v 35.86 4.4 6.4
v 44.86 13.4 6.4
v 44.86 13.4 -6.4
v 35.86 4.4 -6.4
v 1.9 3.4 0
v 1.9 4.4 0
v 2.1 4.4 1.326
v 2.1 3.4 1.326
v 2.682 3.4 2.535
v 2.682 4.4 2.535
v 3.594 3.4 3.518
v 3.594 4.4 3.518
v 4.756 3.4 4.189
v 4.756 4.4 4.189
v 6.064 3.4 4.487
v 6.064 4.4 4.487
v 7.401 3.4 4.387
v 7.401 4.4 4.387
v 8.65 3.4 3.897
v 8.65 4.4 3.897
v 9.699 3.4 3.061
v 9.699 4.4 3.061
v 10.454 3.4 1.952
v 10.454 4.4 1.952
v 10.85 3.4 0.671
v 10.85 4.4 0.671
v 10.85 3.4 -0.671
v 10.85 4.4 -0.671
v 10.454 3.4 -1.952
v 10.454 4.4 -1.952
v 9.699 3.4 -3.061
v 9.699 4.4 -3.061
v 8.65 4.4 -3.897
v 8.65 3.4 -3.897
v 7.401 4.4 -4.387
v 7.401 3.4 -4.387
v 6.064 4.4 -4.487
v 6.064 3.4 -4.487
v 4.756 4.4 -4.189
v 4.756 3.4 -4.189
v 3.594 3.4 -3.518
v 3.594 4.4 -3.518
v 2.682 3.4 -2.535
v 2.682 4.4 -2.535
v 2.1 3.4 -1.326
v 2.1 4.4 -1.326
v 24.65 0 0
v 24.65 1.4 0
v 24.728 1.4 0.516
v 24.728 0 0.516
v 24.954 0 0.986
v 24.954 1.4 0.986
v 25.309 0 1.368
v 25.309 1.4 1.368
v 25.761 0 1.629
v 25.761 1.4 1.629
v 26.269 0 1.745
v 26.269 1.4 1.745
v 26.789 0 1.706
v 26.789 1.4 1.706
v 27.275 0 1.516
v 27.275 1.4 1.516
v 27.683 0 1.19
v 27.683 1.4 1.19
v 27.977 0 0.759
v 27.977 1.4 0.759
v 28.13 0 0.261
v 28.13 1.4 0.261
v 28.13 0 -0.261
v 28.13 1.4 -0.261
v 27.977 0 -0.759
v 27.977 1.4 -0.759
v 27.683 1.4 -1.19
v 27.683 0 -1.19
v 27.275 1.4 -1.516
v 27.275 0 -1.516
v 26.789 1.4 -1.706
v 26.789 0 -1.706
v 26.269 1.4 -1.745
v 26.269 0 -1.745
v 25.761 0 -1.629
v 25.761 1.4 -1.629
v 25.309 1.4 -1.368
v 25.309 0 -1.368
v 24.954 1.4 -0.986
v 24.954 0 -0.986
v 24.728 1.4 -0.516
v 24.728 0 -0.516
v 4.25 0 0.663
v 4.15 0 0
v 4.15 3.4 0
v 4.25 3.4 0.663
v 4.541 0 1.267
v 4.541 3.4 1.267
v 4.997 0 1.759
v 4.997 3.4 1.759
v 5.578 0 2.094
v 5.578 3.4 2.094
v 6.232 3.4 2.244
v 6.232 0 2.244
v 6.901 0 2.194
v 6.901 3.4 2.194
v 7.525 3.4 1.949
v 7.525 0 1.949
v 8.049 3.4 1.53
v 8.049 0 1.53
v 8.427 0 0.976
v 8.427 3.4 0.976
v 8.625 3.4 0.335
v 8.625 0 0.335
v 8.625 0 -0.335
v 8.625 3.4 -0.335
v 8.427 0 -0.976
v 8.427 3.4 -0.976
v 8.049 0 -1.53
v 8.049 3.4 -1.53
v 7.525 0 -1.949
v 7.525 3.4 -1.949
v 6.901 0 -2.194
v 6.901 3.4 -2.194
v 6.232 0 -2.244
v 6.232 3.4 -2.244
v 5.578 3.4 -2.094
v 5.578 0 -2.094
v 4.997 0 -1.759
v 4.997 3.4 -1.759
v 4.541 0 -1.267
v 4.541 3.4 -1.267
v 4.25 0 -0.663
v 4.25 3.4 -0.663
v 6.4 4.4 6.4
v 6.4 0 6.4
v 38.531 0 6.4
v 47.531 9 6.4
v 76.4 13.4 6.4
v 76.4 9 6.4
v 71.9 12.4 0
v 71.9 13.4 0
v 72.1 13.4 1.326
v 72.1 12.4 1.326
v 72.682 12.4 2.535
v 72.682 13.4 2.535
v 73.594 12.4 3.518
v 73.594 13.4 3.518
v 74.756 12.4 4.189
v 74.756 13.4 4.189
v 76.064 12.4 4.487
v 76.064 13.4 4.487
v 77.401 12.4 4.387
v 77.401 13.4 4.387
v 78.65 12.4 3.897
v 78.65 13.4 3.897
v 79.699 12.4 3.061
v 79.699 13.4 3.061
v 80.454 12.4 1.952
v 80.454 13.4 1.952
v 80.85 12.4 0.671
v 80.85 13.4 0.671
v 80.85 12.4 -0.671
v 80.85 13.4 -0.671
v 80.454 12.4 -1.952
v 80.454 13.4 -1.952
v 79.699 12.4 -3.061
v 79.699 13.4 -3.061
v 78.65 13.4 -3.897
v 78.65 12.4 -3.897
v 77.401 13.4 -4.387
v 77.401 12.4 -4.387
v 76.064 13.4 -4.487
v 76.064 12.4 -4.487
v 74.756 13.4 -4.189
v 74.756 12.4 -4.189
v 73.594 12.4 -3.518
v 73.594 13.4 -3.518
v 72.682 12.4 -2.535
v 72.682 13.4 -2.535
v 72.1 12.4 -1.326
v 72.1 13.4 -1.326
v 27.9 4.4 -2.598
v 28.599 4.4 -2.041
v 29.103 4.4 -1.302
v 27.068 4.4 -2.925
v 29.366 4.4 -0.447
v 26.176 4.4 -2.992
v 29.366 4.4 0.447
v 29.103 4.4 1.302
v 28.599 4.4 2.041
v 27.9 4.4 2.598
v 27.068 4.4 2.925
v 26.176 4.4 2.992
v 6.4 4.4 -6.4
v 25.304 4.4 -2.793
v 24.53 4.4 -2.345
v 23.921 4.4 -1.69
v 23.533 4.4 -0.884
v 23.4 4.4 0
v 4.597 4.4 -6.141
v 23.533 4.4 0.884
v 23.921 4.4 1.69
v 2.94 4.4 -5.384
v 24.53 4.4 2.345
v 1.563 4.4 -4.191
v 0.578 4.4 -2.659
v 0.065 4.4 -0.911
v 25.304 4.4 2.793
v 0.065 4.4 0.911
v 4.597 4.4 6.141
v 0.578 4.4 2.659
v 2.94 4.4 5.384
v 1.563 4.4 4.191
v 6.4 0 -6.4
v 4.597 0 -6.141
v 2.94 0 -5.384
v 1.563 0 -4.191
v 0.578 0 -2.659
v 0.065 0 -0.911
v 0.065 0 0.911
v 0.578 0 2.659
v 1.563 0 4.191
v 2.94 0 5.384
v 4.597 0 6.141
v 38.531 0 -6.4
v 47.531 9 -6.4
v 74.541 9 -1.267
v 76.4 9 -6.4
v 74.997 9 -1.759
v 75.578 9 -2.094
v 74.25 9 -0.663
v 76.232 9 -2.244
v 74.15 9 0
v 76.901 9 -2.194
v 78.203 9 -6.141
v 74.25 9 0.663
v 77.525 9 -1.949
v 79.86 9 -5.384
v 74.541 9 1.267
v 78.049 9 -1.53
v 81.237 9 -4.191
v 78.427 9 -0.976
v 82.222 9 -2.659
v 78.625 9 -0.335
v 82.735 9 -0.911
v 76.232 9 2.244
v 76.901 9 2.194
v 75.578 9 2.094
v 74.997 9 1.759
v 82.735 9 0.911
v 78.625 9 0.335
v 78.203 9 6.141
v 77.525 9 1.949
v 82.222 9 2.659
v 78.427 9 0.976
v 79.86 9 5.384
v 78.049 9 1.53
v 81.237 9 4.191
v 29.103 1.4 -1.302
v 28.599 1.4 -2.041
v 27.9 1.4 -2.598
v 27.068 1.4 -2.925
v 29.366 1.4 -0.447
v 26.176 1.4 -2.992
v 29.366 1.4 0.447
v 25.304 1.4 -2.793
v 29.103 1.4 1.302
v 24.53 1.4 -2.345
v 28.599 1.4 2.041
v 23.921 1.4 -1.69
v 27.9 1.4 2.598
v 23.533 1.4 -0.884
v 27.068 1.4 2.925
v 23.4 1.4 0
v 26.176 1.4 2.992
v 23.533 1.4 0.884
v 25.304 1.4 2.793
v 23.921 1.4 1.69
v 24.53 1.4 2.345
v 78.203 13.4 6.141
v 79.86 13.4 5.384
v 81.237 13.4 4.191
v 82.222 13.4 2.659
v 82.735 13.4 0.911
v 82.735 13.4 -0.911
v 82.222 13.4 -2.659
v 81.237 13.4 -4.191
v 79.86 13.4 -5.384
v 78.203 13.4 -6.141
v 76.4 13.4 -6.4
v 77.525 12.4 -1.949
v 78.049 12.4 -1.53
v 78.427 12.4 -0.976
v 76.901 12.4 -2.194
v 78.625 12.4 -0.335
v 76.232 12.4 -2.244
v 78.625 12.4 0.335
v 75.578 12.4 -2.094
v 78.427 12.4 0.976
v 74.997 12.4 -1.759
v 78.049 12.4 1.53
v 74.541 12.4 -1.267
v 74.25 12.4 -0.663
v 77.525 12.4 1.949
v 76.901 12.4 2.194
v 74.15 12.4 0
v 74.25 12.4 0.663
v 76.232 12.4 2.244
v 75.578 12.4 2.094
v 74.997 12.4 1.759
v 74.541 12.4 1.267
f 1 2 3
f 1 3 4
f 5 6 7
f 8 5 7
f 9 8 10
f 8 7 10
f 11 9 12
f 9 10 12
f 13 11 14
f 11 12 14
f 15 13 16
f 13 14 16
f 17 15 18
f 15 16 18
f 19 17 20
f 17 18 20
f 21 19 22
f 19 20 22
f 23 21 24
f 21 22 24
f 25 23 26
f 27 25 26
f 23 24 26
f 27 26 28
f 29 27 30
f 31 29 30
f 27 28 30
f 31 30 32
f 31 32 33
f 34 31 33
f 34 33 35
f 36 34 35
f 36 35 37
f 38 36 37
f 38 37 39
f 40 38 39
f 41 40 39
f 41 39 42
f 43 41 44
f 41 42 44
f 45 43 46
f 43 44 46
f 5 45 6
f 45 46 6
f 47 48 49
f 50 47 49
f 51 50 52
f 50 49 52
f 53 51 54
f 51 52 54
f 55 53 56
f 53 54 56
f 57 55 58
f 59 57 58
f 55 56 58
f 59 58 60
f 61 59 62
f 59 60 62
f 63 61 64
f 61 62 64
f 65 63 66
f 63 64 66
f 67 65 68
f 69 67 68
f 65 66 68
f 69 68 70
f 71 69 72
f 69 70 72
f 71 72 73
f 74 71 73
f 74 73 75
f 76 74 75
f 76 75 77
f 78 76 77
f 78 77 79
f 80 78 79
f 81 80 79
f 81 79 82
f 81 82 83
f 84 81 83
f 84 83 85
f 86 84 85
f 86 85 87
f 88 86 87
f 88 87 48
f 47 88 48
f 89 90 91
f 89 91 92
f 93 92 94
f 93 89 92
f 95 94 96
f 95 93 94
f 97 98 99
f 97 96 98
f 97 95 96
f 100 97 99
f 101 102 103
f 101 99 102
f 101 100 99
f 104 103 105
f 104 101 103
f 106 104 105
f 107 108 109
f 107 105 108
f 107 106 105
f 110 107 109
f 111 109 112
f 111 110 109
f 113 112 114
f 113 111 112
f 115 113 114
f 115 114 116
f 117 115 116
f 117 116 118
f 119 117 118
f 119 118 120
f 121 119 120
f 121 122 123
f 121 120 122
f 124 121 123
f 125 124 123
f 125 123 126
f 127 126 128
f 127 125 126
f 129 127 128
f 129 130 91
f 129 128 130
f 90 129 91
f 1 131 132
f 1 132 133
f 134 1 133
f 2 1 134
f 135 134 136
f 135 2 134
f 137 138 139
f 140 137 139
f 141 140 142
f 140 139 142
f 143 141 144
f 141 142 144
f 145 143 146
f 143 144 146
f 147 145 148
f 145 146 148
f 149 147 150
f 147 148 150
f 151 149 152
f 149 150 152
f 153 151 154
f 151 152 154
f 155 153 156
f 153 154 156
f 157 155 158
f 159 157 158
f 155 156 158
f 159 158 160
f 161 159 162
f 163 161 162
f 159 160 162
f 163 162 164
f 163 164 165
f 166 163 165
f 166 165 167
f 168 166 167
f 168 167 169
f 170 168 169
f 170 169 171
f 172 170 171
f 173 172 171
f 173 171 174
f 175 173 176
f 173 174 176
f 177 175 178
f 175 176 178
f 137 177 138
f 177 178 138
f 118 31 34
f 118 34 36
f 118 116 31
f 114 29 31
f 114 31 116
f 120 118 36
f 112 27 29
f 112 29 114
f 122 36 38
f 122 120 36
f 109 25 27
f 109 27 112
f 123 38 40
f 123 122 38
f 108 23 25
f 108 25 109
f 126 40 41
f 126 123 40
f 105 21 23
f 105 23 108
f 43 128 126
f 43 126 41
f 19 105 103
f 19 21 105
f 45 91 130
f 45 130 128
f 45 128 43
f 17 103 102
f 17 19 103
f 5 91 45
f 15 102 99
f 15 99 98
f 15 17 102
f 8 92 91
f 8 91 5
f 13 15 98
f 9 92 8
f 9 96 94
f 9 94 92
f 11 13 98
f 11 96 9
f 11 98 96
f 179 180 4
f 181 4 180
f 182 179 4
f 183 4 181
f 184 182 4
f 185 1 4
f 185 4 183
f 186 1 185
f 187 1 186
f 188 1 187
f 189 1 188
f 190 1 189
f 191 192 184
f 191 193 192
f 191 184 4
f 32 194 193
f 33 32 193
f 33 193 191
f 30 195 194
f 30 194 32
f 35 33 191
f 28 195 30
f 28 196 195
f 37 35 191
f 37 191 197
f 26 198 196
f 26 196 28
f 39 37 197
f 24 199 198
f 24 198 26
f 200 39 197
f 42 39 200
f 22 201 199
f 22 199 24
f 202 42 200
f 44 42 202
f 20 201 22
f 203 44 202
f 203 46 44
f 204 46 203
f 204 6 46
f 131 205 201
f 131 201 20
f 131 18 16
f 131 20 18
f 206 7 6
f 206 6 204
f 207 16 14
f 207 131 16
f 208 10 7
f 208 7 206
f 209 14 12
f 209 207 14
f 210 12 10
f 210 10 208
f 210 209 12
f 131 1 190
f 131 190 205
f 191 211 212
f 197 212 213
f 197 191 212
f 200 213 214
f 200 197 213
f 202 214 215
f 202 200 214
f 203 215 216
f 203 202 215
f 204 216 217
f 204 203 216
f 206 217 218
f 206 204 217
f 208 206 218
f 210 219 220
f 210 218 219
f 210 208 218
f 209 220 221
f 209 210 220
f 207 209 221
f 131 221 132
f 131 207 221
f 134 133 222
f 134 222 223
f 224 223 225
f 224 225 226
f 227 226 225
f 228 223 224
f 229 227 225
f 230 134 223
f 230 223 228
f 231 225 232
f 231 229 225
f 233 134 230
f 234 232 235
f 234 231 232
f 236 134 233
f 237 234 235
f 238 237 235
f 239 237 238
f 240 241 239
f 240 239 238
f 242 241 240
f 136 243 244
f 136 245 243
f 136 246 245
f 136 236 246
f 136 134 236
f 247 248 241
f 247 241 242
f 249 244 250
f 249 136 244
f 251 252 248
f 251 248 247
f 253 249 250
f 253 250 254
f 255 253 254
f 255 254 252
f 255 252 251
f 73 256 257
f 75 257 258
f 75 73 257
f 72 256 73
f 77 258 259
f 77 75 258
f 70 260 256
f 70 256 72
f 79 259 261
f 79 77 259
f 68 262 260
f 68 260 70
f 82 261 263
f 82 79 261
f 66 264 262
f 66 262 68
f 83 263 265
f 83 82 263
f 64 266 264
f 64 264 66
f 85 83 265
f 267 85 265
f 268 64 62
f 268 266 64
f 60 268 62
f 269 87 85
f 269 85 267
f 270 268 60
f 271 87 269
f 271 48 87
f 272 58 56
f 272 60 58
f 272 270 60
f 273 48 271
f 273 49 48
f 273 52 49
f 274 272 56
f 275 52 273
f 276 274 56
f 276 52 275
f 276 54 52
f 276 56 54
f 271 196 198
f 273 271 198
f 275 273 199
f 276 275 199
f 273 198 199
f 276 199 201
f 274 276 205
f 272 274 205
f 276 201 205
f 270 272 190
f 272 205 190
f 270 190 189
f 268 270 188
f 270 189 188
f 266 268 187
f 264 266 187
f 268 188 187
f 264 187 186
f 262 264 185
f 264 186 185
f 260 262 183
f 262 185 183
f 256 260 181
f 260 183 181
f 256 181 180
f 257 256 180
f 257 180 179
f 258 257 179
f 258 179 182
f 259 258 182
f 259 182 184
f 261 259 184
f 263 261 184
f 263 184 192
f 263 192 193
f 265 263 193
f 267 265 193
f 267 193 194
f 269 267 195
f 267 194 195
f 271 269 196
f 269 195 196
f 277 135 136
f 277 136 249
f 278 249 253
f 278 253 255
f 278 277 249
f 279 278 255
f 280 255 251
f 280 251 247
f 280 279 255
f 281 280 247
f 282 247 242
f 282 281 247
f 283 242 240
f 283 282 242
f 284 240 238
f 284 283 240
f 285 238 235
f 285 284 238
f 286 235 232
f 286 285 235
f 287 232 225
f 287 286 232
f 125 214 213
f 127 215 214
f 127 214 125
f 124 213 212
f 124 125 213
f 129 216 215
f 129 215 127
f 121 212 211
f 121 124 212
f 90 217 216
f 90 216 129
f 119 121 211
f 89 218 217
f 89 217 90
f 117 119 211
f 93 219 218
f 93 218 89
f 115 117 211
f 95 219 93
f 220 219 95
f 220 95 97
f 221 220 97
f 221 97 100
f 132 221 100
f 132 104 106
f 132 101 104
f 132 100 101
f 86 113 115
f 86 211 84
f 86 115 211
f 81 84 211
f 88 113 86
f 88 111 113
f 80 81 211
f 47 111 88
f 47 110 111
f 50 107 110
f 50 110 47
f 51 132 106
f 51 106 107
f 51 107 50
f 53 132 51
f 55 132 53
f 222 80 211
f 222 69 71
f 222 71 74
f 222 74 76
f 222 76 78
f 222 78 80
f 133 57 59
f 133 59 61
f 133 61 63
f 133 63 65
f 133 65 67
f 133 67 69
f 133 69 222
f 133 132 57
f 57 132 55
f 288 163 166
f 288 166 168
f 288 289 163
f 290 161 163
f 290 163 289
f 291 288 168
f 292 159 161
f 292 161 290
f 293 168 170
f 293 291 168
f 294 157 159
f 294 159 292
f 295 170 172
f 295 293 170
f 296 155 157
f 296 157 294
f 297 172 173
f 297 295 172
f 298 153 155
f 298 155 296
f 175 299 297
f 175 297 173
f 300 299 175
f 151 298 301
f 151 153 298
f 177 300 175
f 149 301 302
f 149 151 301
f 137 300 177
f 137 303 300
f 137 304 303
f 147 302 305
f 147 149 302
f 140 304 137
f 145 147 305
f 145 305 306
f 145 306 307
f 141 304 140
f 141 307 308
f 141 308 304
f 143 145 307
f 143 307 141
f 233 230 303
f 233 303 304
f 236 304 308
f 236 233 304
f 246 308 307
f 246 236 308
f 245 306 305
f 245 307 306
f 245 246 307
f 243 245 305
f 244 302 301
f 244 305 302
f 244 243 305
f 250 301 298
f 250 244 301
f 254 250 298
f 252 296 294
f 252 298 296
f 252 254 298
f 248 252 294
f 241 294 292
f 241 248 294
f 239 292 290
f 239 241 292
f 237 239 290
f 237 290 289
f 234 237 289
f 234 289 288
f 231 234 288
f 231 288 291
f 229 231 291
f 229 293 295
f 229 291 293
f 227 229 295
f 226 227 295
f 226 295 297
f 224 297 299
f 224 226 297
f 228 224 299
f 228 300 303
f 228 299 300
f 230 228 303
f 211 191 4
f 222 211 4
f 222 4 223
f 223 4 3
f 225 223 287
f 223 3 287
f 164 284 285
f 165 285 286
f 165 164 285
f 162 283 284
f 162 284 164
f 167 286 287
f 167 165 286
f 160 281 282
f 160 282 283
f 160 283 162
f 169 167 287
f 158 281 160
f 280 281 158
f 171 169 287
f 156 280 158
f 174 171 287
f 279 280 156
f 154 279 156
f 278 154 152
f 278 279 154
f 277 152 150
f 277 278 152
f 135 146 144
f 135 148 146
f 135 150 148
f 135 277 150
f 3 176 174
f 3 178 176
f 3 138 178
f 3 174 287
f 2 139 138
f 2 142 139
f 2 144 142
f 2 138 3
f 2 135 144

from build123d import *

# Parameters (mm, degrees)
EXTRUDE_1_DEPTH          = 6.4
SKETCH_2_OUTSIDE_W       = 101.77
SKETCH_2_OUTSIDE_H       = 31.77
CUT_EXTRUDE_1_DEPTH      = 85.121103179
CUT_EXTRUDE_2_DEPTH      = 84.533226922
CUT_EXTRUDE_2_DEPTH_BACK = 84.533226922
SKETCH_3_R               = 2.25
SKETCH_4_R               = 4.5
CUT_EXTRUDE_3_DEPTH      = 1
SKETCH_5_R               = 4.5
CUT_EXTRUDE_4_DEPTH      = 1
SKETCH_6_R               = 3
CUT_EXTRUDE_5_DEPTH      = 3
SKETCH_7_R               = 1.75
CUT_EXTRUDE_6_DEPTH      = 84.533226922


with BuildPart() as part:
    # 草图1 → 凸台-拉伸1 (new, symmetric)
    with BuildSketch(Plane.XY):
        Polygon((0, 0), (38.531067812, 0), (47.531067812, 9), (82.8, 9), (82.8, 13.4), (44.86, 13.4), (35.86, 4.4), (0, 4.4), align=None)
    extrude(amount=EXTRUDE_1_DEPTH, both=True)

    # 草图2 outside → 切除-拉伸1 (cut, through all)
    with BuildSketch(Plane(origin=(0, 13.4, 0), x_dir=(1, 0, 0), z_dir=(0, 1, 0))):
        with Locations((41.4, 0)):
            Rectangle(SKETCH_2_OUTSIDE_W, SKETCH_2_OUTSIDE_H)
        with BuildLine():
            Line((76.4, 6.4), (44.86, 6.4))
            Line((44.86, 6.4), (35.86, 6.4))
            Line((35.86, 6.4), (6.4, 6.4))
            ThreePointArc((6.4, 6.4), (0, 0), (6.4, -6.4))
            Line((6.4, -6.4), (35.86, -6.4))
            Line((35.86, -6.4), (44.86, -6.4))
            Line((44.86, -6.4), (76.4, -6.4))
            ThreePointArc((76.4, -6.4), (82.8, 0), (76.4, 6.4))
        make_face(mode=Mode.SUBTRACT)
    extrude(amount=-CUT_EXTRUDE_1_DEPTH, mode=Mode.SUBTRACT)

    # 草图3 → 切除-拉伸2 (cut, two sides: drawn at the far end of the back side and taken through both)
    with BuildSketch(Plane(origin=(0, 4.4, 0), x_dir=(1, 0, 0), z_dir=(0, 1, 0)).offset(-CUT_EXTRUDE_2_DEPTH_BACK)):
        with Locations(Location((6.4, 0, 0), (0, 0, 180))):
            Circle(SKETCH_3_R)
        with Locations(Location((76.4, 0, 0), (0, 0, 180))):
            Circle(SKETCH_3_R)
    extrude(amount=CUT_EXTRUDE_2_DEPTH + CUT_EXTRUDE_2_DEPTH_BACK, mode=Mode.SUBTRACT)

    # 草图4 → 切除-拉伸3 (cut)
    with BuildSketch(Plane(origin=(0, 13.4, 0), x_dir=(1, 0, 0), z_dir=(0, 1, 0))):
        with Locations(Location((76.4, 0, 0), (0, 0, 180))):
            Circle(SKETCH_4_R)
    extrude(amount=-CUT_EXTRUDE_3_DEPTH, mode=Mode.SUBTRACT)

    # 草图5 → 切除-拉伸4 (cut)
    with BuildSketch(Plane(origin=(0, 4.4, 0), x_dir=(1, 0, 0), z_dir=(0, 1, 0))):
        with Locations(Location((6.4, 0, 0), (0, 0, 180))):
            Circle(SKETCH_5_R)
    extrude(amount=-CUT_EXTRUDE_4_DEPTH, mode=Mode.SUBTRACT)

    # 草图6 → 切除-拉伸5 (cut)
    with BuildSketch(Plane(origin=(0, 4.4, 0), x_dir=(1, 0, 0), z_dir=(0, 1, 0))):
        with Locations(Location((26.4, 0, 0), (0, 0, 180))):
            Circle(SKETCH_6_R)
    extrude(amount=-CUT_EXTRUDE_5_DEPTH, mode=Mode.SUBTRACT)

    # 草图7 → 切除-拉伸6 (cut, through all)
    with BuildSketch(Plane(origin=(0, 4.4, 0), x_dir=(1, 0, 0), z_dir=(0, 1, 0))):
        with Locations(Location((26.4, 0, 0), (0, 0, 180))):
            Circle(SKETCH_7_R)
    extrude(amount=-CUT_EXTRUDE_6_DEPTH, mode=Mode.SUBTRACT)


solid = part.part
